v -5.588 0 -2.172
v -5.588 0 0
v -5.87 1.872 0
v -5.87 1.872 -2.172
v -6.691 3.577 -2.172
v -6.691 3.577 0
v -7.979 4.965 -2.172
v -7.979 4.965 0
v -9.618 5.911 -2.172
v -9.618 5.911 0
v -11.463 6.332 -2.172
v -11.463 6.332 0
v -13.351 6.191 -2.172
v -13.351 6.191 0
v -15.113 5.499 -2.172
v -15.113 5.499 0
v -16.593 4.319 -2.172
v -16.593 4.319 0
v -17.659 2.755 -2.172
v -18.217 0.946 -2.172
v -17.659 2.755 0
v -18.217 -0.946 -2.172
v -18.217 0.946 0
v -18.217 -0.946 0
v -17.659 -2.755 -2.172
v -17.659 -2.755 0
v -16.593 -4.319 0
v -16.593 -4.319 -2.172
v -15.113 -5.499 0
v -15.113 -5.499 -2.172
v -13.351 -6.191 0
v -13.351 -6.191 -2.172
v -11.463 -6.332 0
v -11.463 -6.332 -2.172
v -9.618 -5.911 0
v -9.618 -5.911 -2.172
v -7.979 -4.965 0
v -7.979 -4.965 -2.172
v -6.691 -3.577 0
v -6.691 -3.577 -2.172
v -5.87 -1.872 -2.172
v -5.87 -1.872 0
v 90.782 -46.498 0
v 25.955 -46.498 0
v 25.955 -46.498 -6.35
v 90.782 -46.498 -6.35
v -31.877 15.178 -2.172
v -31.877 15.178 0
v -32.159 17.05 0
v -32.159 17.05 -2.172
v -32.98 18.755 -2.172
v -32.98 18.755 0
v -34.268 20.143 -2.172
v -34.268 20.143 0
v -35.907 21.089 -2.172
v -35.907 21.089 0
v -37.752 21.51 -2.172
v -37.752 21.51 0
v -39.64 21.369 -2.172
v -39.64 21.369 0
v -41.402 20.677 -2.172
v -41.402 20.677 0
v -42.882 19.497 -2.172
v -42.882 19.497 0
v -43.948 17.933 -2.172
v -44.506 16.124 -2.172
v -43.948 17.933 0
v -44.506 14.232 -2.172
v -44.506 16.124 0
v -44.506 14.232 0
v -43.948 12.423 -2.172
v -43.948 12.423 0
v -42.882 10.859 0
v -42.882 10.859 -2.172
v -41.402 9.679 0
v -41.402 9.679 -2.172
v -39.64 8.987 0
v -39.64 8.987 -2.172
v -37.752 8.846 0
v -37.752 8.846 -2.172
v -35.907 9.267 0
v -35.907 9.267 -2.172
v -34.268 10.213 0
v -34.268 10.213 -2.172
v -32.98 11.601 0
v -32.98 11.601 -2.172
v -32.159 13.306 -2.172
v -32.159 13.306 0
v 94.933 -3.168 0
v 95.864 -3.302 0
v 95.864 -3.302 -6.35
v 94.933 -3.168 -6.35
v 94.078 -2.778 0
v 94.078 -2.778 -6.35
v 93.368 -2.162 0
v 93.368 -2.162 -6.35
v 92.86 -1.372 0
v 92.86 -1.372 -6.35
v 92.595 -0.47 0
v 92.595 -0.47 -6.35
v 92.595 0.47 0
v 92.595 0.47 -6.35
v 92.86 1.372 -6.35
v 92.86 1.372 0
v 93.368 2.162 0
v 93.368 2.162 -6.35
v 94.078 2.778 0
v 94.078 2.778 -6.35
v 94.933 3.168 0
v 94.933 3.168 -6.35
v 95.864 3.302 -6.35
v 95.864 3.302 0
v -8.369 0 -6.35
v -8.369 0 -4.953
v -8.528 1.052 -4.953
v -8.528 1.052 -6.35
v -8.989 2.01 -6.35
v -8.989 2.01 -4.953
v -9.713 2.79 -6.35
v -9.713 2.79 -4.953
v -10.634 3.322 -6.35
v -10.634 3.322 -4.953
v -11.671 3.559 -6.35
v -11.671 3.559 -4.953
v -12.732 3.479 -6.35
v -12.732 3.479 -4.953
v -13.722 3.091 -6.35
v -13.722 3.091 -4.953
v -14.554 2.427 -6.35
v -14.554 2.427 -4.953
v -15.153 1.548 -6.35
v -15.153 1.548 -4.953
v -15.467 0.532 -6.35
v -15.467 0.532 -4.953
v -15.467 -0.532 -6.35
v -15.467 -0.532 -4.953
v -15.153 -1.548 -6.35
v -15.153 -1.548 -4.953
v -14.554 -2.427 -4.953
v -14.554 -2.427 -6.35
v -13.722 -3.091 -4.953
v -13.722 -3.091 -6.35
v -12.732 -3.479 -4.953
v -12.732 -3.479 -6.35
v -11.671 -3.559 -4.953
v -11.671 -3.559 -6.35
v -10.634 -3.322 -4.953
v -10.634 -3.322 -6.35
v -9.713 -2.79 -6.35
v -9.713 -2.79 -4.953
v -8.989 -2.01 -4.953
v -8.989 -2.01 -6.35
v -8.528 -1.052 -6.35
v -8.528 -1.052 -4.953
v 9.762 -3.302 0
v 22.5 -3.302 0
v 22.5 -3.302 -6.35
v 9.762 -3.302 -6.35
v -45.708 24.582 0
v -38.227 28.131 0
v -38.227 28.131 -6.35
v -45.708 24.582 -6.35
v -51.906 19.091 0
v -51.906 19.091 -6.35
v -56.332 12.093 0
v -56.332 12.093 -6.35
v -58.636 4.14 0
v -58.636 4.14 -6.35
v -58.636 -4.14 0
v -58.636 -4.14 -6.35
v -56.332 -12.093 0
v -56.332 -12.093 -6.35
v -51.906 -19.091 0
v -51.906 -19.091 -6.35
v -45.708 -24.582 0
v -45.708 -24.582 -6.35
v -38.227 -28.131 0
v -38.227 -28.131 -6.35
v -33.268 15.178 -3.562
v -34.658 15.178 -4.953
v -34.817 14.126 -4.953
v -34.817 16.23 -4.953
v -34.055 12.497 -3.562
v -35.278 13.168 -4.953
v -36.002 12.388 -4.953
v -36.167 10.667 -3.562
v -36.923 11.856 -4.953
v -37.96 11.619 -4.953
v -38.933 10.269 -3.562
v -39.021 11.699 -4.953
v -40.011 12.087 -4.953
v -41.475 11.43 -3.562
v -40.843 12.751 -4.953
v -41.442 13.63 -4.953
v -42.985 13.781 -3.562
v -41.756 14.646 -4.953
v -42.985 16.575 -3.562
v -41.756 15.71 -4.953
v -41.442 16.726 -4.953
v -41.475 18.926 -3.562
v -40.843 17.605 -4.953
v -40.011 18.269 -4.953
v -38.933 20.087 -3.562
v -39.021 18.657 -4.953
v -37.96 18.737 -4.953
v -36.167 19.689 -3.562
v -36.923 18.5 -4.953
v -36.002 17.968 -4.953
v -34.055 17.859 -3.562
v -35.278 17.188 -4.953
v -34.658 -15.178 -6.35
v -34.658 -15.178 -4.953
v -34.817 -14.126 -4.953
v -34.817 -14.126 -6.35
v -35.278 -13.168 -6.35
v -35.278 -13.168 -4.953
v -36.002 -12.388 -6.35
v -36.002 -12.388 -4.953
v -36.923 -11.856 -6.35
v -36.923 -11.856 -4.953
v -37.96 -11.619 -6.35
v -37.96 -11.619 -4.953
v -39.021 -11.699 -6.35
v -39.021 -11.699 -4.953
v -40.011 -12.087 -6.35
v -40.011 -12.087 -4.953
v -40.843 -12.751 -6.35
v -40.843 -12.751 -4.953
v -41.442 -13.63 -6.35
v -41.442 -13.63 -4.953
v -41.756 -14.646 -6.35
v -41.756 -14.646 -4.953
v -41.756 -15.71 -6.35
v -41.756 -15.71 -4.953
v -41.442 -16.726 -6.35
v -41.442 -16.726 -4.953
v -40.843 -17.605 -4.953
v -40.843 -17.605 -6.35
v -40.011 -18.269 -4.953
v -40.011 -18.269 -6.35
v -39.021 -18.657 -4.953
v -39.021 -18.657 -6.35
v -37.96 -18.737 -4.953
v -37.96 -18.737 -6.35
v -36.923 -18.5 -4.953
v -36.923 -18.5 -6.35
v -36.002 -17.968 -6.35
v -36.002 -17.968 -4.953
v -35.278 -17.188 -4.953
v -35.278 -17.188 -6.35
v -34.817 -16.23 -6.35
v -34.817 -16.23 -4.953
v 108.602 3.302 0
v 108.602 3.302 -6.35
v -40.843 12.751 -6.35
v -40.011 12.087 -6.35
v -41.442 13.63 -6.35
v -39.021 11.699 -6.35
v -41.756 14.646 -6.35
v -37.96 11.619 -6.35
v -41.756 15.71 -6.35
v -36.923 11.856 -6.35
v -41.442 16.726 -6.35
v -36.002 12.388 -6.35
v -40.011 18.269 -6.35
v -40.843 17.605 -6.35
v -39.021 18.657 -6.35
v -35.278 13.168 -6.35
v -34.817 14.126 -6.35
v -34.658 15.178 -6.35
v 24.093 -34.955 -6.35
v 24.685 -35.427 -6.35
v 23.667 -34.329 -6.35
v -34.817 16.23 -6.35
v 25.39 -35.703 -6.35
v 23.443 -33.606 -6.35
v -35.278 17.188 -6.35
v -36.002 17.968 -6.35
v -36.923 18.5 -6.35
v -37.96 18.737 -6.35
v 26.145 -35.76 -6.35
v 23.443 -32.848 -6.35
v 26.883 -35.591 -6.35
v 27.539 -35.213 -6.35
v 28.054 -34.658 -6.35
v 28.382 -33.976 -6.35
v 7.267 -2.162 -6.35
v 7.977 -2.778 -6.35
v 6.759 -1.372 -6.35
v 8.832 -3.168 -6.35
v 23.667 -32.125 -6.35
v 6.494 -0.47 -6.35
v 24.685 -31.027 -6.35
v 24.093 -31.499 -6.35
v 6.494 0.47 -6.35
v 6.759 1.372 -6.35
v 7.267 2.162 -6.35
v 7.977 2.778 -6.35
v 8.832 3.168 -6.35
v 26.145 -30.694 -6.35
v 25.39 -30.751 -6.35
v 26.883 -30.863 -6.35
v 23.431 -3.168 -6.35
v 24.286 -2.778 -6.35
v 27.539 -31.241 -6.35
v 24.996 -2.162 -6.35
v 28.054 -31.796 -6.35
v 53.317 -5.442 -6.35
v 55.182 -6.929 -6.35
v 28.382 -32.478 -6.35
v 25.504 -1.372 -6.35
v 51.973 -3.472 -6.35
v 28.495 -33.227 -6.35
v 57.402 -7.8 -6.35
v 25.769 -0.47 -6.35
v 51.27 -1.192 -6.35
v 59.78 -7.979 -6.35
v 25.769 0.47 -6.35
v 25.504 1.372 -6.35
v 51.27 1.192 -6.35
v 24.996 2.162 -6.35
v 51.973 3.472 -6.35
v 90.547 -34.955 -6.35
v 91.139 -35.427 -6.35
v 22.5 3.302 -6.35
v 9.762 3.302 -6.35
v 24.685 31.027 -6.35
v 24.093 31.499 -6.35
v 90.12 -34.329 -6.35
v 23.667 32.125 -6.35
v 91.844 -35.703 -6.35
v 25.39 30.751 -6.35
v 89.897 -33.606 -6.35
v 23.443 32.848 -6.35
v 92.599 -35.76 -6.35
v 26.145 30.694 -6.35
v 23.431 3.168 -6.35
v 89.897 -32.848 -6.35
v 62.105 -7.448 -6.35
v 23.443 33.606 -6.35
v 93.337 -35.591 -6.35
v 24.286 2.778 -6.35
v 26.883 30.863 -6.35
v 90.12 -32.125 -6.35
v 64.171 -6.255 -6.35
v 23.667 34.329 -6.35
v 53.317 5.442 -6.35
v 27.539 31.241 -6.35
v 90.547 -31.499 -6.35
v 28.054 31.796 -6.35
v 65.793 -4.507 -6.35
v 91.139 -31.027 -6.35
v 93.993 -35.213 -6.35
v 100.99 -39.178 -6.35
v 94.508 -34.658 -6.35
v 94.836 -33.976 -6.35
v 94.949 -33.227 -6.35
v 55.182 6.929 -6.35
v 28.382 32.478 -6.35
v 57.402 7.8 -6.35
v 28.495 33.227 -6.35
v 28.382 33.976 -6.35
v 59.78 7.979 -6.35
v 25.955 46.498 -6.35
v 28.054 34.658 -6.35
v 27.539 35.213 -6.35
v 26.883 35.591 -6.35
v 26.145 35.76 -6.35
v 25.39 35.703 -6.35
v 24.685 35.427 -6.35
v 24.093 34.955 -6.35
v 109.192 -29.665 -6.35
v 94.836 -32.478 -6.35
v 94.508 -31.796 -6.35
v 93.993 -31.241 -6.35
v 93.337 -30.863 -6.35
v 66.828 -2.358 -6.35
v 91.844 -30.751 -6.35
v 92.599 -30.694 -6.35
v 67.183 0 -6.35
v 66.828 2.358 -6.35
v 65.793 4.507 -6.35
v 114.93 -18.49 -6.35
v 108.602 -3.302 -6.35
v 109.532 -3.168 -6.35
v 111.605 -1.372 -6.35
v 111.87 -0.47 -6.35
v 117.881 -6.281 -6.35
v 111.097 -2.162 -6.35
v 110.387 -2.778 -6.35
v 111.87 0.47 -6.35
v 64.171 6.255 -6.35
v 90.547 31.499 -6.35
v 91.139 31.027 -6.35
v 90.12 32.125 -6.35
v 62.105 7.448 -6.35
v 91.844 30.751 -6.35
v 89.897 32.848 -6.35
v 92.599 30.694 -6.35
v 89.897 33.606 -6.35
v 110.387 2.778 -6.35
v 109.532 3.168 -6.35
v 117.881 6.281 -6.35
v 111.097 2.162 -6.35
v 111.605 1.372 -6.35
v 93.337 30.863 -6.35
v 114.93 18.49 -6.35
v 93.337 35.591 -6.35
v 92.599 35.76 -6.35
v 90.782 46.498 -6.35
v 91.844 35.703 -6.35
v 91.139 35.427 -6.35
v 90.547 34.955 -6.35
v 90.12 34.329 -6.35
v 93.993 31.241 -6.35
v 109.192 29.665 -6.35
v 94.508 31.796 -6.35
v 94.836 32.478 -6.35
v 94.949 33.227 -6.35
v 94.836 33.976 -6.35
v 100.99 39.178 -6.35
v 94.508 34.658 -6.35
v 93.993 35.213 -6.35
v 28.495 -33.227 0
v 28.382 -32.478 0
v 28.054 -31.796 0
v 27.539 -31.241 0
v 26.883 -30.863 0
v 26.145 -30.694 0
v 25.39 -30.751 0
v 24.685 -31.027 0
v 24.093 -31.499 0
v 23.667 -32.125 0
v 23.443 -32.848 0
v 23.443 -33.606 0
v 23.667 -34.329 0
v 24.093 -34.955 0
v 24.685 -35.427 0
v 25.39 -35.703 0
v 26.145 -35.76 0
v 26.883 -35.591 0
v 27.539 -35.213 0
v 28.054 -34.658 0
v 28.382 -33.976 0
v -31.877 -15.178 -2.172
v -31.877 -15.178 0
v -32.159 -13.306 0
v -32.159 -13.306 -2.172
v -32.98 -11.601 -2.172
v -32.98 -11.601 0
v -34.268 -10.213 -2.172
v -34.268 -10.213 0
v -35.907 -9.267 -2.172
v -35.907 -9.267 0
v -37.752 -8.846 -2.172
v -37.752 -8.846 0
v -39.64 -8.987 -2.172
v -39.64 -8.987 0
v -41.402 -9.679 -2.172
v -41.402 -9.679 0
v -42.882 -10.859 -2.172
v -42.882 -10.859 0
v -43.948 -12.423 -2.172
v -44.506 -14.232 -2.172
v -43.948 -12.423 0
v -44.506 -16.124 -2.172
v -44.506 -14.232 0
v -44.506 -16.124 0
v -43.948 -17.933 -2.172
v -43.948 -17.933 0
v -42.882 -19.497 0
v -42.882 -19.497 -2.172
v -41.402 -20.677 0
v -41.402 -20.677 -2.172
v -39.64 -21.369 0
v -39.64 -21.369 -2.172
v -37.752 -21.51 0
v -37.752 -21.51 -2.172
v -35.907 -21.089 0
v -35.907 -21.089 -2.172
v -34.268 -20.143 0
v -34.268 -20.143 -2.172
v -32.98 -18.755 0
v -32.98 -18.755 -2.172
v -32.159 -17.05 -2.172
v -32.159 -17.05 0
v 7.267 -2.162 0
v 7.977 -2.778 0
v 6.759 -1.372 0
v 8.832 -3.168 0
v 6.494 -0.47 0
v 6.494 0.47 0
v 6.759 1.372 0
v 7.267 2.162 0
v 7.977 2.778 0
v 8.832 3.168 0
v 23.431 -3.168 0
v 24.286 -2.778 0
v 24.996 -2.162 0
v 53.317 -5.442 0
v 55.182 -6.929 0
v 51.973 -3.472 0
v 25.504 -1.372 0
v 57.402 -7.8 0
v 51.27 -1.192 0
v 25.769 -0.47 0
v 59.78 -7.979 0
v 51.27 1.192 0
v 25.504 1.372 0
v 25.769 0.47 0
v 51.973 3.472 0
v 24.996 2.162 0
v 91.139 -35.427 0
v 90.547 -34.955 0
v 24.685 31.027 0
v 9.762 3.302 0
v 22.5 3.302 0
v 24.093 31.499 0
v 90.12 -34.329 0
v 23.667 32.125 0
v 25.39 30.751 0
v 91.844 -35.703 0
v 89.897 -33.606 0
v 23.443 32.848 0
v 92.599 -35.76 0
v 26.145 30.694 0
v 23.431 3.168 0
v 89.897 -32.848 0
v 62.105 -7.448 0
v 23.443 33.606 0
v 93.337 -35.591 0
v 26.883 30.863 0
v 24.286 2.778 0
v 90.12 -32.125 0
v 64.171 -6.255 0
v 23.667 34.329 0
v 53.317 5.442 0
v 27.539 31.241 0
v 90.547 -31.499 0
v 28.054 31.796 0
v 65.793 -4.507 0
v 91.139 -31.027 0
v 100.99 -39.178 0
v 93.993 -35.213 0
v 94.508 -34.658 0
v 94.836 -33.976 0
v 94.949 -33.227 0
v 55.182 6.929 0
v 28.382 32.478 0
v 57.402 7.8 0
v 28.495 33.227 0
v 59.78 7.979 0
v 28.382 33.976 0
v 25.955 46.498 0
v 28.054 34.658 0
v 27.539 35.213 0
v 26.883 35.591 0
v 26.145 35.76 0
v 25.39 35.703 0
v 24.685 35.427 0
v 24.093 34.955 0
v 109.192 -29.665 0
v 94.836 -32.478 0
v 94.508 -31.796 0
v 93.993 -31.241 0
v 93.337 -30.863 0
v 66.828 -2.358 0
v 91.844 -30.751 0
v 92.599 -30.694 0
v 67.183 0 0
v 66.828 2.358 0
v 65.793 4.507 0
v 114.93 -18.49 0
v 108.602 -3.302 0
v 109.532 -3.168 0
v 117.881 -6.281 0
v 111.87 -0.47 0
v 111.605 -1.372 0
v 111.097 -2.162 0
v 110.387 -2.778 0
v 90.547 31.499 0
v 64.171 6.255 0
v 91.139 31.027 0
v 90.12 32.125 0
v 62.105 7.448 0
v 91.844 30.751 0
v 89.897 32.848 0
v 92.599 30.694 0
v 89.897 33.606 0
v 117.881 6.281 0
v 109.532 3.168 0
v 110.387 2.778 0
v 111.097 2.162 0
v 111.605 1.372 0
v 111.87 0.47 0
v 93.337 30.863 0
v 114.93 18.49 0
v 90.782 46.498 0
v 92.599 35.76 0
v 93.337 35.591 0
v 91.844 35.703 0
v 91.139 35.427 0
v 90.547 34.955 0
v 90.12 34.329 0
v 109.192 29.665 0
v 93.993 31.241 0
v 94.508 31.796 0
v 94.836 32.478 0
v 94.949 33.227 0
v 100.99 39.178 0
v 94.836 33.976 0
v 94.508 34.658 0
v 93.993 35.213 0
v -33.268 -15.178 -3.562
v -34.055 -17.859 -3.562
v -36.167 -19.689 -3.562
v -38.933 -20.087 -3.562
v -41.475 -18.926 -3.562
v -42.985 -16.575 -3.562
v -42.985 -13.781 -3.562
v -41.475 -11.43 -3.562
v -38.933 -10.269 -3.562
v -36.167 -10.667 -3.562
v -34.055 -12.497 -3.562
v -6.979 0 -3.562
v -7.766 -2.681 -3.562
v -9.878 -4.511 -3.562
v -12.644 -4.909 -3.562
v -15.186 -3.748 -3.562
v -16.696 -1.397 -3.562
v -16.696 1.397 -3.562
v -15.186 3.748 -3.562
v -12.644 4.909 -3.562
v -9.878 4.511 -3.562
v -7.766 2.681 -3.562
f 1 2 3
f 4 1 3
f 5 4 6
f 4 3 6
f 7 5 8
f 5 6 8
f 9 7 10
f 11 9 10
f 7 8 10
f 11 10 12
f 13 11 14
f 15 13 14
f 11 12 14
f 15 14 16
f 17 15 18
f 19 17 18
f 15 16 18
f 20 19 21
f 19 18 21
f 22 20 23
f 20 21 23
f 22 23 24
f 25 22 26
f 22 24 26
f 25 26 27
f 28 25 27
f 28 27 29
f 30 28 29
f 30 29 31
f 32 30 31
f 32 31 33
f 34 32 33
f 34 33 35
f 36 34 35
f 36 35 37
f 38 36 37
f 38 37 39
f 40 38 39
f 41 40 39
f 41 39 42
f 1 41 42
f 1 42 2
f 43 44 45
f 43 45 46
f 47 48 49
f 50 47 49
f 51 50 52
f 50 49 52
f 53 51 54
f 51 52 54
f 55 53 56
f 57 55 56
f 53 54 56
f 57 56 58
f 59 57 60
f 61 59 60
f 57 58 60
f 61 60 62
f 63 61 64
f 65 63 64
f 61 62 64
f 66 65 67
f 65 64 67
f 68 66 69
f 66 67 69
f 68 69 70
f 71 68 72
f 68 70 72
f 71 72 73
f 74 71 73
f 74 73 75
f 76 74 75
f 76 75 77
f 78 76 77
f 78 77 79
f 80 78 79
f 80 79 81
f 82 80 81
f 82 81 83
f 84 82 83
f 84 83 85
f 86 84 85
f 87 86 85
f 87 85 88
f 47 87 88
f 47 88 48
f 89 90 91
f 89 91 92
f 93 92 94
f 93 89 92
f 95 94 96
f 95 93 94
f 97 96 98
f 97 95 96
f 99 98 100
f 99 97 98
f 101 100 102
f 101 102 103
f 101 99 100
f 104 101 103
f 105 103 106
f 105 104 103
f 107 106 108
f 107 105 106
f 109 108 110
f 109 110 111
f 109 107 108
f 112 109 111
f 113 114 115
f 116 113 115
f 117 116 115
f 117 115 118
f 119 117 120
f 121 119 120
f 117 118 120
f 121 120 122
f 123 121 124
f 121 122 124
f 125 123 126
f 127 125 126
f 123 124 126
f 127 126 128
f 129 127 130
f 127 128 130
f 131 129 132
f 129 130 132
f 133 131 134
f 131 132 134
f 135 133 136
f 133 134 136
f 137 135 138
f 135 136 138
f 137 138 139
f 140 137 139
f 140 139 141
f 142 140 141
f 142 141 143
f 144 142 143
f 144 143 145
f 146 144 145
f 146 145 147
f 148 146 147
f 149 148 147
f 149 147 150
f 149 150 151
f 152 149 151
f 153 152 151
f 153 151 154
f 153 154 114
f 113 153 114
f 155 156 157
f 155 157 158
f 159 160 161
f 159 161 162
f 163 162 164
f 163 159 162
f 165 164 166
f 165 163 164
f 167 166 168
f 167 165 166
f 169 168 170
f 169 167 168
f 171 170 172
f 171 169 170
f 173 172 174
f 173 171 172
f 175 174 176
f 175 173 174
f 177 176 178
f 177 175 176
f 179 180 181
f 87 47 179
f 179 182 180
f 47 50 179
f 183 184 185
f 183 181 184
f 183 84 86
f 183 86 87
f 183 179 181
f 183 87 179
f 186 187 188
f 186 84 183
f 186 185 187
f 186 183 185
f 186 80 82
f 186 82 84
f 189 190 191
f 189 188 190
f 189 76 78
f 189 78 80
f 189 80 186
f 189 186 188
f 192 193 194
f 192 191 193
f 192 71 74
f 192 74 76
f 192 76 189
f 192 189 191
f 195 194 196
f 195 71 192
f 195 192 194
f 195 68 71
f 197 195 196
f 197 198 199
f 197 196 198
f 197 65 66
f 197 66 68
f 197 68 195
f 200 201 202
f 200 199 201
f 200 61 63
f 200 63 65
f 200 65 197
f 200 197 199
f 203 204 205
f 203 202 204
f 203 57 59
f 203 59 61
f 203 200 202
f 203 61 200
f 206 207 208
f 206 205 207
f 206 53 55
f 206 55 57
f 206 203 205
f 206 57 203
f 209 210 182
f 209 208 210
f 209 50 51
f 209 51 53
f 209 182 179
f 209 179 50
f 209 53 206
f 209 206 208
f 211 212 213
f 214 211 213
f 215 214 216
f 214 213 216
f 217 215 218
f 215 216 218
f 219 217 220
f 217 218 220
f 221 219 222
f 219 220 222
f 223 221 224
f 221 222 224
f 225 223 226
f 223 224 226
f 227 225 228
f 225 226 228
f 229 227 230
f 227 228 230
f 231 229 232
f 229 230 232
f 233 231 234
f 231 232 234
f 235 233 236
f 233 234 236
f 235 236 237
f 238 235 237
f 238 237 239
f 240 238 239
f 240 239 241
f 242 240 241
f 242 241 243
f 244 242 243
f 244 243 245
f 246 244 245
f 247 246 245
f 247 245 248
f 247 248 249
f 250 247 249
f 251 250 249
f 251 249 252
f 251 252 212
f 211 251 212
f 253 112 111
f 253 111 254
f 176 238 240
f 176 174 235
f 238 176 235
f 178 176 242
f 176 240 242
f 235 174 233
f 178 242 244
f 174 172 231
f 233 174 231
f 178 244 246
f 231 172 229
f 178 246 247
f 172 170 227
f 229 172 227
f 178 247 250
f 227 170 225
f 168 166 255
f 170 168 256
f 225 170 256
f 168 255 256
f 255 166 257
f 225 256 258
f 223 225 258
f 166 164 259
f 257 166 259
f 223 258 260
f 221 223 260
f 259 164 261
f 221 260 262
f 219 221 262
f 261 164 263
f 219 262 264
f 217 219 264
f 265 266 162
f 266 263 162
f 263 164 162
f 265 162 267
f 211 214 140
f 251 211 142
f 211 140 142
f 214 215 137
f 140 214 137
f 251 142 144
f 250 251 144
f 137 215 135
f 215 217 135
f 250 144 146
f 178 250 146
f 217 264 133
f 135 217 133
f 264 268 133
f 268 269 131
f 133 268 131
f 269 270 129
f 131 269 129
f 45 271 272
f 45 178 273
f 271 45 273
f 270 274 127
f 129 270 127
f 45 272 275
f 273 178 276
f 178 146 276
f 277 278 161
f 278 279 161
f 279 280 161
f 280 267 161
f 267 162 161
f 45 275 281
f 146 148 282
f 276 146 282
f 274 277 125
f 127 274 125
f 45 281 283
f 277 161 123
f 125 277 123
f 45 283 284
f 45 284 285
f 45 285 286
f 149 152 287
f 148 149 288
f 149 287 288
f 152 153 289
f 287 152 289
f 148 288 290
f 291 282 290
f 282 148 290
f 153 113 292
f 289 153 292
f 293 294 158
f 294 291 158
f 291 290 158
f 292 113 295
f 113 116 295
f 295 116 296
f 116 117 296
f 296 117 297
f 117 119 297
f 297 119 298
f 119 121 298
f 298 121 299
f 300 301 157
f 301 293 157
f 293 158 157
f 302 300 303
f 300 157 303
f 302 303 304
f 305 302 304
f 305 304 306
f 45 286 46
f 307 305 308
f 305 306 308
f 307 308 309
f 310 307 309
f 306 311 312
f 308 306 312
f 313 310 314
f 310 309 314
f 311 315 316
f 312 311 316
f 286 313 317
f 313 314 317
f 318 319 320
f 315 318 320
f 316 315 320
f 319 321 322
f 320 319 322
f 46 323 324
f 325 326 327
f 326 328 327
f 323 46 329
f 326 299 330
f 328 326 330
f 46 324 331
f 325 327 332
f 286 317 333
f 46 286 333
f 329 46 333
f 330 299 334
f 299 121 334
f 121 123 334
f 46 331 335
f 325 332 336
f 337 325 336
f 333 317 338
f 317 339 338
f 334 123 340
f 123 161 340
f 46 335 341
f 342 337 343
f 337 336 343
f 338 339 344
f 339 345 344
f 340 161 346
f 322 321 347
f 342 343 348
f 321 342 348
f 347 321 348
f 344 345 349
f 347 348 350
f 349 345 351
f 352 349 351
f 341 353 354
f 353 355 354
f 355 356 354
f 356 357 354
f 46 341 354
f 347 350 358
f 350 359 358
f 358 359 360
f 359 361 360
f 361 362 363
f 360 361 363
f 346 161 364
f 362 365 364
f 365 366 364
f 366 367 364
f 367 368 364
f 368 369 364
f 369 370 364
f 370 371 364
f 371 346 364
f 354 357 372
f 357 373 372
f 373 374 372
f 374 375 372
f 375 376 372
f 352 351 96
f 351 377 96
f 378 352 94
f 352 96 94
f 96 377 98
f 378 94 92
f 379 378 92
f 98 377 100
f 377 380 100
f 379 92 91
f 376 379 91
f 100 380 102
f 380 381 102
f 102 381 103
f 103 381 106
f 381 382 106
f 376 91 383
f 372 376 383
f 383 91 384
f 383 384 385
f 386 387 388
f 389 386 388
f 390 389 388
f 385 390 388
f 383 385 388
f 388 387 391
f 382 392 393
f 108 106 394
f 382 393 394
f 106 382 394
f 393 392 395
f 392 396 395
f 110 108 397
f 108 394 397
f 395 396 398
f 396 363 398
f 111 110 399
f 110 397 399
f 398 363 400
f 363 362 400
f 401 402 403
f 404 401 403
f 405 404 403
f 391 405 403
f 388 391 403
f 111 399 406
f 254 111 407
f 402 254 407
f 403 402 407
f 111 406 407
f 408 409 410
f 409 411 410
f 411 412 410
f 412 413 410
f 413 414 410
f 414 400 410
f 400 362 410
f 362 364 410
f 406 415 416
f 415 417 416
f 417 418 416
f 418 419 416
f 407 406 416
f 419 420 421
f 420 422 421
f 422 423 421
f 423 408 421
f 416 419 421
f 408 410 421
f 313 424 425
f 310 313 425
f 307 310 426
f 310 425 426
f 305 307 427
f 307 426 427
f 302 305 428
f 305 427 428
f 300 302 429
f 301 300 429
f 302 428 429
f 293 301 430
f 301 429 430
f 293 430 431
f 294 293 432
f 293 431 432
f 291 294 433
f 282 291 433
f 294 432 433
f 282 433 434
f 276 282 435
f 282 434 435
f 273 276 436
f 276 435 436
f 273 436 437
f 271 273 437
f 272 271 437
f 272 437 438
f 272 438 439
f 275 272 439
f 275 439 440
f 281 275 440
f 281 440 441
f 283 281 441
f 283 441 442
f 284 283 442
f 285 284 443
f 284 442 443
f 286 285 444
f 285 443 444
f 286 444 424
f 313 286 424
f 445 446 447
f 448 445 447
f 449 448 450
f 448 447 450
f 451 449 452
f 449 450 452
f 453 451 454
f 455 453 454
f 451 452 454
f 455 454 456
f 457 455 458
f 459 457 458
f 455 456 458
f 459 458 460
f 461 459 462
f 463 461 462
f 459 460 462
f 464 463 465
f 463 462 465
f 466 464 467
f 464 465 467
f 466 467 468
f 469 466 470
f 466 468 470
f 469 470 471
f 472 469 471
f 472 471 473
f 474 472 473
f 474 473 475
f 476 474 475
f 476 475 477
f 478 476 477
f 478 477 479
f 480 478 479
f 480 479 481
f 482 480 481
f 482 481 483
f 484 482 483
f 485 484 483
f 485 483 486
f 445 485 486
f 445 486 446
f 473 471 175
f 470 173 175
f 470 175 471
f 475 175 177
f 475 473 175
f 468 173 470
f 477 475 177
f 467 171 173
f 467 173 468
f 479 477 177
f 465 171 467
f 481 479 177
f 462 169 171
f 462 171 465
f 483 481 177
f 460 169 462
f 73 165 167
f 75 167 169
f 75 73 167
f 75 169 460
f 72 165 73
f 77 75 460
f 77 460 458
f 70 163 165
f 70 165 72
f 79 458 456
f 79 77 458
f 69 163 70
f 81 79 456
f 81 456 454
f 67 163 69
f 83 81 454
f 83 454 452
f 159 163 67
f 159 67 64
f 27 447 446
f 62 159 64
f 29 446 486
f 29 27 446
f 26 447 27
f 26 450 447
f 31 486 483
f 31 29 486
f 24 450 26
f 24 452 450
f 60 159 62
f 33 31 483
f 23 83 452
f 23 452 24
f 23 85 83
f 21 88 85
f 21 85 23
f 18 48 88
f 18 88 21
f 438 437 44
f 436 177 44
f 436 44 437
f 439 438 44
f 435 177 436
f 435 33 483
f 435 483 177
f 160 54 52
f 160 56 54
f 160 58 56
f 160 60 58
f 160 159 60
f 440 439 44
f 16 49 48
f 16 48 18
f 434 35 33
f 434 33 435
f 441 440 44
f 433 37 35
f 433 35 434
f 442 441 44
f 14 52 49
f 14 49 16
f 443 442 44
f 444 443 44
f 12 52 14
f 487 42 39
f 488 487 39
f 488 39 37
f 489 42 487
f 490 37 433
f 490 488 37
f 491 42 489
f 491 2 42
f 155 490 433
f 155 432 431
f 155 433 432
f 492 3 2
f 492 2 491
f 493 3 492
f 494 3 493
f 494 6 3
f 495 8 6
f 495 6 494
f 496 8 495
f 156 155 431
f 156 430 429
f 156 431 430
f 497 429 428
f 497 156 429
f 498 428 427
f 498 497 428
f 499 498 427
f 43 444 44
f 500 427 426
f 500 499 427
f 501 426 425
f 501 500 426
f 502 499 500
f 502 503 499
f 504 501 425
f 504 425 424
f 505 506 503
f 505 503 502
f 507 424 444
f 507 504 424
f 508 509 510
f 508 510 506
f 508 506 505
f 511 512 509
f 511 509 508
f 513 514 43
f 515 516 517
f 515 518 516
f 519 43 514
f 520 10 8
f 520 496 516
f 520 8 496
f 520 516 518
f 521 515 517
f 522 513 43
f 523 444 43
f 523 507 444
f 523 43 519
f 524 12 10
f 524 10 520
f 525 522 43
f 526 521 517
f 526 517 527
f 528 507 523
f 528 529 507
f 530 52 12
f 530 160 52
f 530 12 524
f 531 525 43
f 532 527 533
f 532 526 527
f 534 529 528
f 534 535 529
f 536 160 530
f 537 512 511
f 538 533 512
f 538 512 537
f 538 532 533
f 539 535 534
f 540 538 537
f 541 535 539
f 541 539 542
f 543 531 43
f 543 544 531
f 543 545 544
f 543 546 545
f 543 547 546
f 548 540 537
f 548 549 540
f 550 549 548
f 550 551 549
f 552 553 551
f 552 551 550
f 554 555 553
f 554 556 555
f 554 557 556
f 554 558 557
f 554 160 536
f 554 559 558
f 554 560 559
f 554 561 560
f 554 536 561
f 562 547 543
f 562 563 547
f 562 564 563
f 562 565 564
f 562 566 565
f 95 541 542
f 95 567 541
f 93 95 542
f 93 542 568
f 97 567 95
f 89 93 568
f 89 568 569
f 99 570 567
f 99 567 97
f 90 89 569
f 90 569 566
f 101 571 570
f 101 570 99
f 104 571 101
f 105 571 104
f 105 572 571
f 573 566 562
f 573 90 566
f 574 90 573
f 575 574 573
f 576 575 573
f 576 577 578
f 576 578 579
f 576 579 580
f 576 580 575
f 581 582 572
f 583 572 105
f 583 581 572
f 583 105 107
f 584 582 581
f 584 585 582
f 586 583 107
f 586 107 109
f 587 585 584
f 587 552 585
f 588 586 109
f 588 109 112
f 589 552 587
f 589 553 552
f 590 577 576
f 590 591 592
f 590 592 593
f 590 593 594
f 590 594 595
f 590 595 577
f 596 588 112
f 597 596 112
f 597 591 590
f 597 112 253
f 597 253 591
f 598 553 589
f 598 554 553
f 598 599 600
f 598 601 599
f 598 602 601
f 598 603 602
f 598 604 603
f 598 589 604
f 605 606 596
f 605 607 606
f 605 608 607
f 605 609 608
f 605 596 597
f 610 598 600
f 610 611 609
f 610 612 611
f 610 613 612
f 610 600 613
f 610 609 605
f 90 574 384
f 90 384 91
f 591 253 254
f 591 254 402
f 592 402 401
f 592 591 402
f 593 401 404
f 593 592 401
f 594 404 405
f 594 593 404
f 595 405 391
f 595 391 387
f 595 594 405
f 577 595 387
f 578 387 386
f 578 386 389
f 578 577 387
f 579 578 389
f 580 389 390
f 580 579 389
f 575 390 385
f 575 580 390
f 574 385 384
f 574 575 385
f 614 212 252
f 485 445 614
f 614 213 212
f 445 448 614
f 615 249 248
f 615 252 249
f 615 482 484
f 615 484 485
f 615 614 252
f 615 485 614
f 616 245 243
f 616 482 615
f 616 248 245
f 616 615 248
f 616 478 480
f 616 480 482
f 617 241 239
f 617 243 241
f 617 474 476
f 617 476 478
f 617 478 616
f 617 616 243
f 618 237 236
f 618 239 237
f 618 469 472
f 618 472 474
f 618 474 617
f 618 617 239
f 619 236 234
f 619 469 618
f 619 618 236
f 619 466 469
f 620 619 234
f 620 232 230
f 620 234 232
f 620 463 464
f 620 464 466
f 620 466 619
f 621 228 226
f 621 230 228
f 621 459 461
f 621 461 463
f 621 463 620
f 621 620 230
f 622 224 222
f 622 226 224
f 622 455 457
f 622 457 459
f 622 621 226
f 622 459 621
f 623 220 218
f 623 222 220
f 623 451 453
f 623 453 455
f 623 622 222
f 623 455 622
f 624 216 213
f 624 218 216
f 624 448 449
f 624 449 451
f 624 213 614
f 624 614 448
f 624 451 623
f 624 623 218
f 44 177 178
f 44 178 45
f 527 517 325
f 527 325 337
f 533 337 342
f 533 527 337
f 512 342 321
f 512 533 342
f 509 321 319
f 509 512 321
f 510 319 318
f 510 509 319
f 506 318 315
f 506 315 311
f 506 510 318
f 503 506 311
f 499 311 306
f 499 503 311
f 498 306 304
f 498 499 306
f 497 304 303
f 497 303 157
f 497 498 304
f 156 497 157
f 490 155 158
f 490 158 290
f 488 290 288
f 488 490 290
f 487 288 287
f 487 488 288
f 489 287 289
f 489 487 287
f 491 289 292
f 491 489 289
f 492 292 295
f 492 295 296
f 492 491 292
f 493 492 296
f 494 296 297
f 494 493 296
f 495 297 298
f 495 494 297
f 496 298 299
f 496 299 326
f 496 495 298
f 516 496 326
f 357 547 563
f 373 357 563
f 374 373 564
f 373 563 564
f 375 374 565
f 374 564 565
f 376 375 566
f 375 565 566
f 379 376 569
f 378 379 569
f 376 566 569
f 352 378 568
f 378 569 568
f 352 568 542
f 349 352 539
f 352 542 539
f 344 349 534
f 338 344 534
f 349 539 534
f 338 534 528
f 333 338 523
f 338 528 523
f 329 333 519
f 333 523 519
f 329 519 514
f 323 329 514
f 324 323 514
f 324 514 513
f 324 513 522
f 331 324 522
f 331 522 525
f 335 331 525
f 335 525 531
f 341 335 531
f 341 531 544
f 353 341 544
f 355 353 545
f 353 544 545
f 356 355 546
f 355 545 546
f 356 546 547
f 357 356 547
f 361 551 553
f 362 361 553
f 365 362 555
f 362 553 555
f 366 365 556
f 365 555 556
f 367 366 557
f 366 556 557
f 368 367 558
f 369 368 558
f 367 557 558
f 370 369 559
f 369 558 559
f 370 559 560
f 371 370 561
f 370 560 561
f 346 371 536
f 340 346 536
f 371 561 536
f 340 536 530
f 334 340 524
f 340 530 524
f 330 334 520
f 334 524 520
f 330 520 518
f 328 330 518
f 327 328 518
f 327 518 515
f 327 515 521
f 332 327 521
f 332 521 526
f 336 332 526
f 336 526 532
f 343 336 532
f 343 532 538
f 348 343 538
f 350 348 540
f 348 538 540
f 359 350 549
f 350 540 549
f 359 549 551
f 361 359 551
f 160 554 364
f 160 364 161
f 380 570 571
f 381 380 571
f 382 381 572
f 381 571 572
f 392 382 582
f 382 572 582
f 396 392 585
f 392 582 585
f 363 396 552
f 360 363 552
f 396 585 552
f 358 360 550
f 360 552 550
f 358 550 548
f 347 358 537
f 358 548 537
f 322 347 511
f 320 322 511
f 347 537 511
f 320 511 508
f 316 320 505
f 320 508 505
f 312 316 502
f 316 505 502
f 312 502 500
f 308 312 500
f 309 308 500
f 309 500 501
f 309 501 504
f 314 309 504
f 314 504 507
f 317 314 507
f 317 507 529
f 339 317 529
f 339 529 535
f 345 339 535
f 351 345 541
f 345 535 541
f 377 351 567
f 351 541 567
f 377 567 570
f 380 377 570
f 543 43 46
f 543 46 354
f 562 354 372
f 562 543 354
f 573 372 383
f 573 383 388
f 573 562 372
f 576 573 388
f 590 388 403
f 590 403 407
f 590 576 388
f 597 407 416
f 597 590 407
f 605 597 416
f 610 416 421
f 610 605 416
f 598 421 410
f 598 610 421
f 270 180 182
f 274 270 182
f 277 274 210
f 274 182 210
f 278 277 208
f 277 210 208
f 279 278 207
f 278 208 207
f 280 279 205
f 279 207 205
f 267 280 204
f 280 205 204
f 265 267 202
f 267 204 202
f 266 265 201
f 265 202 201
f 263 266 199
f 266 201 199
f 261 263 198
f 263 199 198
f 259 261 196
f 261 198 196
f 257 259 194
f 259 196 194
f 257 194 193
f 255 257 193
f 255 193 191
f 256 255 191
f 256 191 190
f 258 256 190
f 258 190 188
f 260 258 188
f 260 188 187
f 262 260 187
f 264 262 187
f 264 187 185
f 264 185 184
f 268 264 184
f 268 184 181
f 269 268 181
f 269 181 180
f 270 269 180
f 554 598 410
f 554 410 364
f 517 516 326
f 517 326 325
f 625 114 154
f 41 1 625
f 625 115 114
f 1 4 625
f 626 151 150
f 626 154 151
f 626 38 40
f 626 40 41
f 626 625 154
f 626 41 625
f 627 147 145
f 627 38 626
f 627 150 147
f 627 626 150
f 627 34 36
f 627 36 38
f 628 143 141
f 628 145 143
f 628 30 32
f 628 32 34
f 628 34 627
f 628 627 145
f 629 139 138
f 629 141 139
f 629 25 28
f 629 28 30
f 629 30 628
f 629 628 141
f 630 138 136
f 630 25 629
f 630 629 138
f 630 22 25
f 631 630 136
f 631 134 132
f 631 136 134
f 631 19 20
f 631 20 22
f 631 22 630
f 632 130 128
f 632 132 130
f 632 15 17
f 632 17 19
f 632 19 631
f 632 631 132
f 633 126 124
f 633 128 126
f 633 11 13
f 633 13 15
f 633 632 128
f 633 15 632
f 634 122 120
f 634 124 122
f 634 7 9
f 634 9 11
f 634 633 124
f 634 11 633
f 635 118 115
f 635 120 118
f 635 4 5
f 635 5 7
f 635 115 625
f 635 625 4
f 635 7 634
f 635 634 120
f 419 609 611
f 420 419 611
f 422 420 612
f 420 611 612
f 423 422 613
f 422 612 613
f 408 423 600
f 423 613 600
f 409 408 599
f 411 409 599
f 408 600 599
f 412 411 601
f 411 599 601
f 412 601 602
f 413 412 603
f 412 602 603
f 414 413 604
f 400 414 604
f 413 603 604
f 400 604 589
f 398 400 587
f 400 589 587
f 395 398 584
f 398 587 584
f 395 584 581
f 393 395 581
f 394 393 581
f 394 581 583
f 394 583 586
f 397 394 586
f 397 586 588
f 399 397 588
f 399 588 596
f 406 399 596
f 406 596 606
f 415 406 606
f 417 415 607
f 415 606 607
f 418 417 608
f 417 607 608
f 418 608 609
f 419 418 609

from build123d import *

# Parameters (mm, degrees)
F0_R     = 2.54
F0_R_2   = 3.5687
F0_R_3   = 8.001
F1_DEPTH = 6.35
F3_R     = 3.5687
F4_DEPTH = 4.953
F4_TAPER = -45
F5_R     = 8.5217
F5_R_2   = 6.35
F6_DEPTH = 4.953


with BuildPart() as f1:
    # F0 (on Top) → F1 (new body)
    with BuildSketch(Plane.XY):
        with BuildLine():
            Line((90.7821191281, 46.4983058831), (25.955052352, 46.4983058831))
            Line((25.955052352, 46.4983058831), (-38.227, 28.1307150105))
            ThreePointArc((-38.227, 28.1307150105), (-58.928, 0), (-38.227, -28.1307150105))
            Line((-38.227, -28.1307150105), (25.955052352, -46.4983058831))
            Line((25.955052352, -46.4983058831), (90.7821191281, -46.4983058831))
            ThreePointArc((90.7821191281, -46.4983058831), (118.2538107645, 0), (90.7821191281, 46.4983058831))
        make_face()
        with Locations((25.955052352, -33.226947648)):
            Circle(F0_R, mode=Mode.SUBTRACT)
        with Locations((-38.227, -15.1779612267)):
            Circle(F0_R_2, mode=Mode.SUBTRACT)
        with Locations((92.408947648, -33.226947648)):
            Circle(F0_R, mode=Mode.SUBTRACT)
        with Locations((-38.227, 15.1779612267)):
            Circle(F0_R_2, mode=Mode.SUBTRACT)
        with Locations((-11.938, 0)):
            Circle(F0_R_2, mode=Mode.SUBTRACT)
        with BuildLine():
            ThreePointArc((22.5003193406, 3.302), (25.8023193406, 0), (22.5003193406, -3.302))
            Line((22.5003193406, -3.302), (9.7621892355, -3.302))
            ThreePointArc((9.7621892355, -3.302), (6.4601892355, 0), (9.7621892355, 3.302))
            Line((9.7621892355, 3.302), (22.5003193406, 3.302))
        make_face(mode=Mode.SUBTRACT)
        with Locations((25.955052352, 33.226947648)):
            Circle(F0_R, mode=Mode.SUBTRACT)
        with Locations((59.182, 0)):
            Circle(F0_R_3, mode=Mode.SUBTRACT)
        with BuildLine():
            ThreePointArc((95.8636806594, -3.302), (92.5616806594, 0), (95.8636806594, 3.302))
            Line((95.8636806594, 3.302), (108.6018107645, 3.302))
            ThreePointArc((108.6018107645, 3.302), (111.9038107645, 0), (108.6018107645, -3.302))
            Line((108.6018107645, -3.302), (95.8636806594, -3.302))
        make_face(mode=Mode.SUBTRACT)
        with Locations((92.408947648, 33.226947648)):
            Circle(F0_R, mode=Mode.SUBTRACT)
    extrude(amount=-F1_DEPTH)

    # F3 (on offset) → F4 (cut, through all)
    with BuildSketch(Plane(origin=(0, 0, -4.953), x_dir=(1, 0, 0), z_dir=(0, 0, -1))):
        with Locations((-38.227, 15.1779612267)):
            Circle(F3_R)
        with Locations((-38.227, -15.1779612267)):
            Circle(F3_R)
        with Locations((-11.938, 0)):
            Circle(F3_R)
    extrude(amount=-F4_DEPTH, taper=F4_TAPER, mode=Mode.SUBTRACT)

    # F5 (on face) → F6 (join, through all)
    with BuildSketch(Plane.XY):
        with Locations((-11.938, 0)):
            Circle(F5_R)
        with Locations((-11.938, 0)):
            Circle(F5_R_2, mode=Mode.SUBTRACT)
        with Locations((-38.227, 15.1779612267)):
            Circle(F5_R)
        with Locations((-38.227, 15.1779612267)):
            Circle(F5_R_2, mode=Mode.SUBTRACT)
        with Locations((-38.227, -15.1779612267)):
            Circle(F5_R)
        with Locations((-38.227, -15.1779612267)):
            Circle(F5_R_2, mode=Mode.SUBTRACT)
    extrude(amount=-F6_DEPTH)


solid = f1.part
